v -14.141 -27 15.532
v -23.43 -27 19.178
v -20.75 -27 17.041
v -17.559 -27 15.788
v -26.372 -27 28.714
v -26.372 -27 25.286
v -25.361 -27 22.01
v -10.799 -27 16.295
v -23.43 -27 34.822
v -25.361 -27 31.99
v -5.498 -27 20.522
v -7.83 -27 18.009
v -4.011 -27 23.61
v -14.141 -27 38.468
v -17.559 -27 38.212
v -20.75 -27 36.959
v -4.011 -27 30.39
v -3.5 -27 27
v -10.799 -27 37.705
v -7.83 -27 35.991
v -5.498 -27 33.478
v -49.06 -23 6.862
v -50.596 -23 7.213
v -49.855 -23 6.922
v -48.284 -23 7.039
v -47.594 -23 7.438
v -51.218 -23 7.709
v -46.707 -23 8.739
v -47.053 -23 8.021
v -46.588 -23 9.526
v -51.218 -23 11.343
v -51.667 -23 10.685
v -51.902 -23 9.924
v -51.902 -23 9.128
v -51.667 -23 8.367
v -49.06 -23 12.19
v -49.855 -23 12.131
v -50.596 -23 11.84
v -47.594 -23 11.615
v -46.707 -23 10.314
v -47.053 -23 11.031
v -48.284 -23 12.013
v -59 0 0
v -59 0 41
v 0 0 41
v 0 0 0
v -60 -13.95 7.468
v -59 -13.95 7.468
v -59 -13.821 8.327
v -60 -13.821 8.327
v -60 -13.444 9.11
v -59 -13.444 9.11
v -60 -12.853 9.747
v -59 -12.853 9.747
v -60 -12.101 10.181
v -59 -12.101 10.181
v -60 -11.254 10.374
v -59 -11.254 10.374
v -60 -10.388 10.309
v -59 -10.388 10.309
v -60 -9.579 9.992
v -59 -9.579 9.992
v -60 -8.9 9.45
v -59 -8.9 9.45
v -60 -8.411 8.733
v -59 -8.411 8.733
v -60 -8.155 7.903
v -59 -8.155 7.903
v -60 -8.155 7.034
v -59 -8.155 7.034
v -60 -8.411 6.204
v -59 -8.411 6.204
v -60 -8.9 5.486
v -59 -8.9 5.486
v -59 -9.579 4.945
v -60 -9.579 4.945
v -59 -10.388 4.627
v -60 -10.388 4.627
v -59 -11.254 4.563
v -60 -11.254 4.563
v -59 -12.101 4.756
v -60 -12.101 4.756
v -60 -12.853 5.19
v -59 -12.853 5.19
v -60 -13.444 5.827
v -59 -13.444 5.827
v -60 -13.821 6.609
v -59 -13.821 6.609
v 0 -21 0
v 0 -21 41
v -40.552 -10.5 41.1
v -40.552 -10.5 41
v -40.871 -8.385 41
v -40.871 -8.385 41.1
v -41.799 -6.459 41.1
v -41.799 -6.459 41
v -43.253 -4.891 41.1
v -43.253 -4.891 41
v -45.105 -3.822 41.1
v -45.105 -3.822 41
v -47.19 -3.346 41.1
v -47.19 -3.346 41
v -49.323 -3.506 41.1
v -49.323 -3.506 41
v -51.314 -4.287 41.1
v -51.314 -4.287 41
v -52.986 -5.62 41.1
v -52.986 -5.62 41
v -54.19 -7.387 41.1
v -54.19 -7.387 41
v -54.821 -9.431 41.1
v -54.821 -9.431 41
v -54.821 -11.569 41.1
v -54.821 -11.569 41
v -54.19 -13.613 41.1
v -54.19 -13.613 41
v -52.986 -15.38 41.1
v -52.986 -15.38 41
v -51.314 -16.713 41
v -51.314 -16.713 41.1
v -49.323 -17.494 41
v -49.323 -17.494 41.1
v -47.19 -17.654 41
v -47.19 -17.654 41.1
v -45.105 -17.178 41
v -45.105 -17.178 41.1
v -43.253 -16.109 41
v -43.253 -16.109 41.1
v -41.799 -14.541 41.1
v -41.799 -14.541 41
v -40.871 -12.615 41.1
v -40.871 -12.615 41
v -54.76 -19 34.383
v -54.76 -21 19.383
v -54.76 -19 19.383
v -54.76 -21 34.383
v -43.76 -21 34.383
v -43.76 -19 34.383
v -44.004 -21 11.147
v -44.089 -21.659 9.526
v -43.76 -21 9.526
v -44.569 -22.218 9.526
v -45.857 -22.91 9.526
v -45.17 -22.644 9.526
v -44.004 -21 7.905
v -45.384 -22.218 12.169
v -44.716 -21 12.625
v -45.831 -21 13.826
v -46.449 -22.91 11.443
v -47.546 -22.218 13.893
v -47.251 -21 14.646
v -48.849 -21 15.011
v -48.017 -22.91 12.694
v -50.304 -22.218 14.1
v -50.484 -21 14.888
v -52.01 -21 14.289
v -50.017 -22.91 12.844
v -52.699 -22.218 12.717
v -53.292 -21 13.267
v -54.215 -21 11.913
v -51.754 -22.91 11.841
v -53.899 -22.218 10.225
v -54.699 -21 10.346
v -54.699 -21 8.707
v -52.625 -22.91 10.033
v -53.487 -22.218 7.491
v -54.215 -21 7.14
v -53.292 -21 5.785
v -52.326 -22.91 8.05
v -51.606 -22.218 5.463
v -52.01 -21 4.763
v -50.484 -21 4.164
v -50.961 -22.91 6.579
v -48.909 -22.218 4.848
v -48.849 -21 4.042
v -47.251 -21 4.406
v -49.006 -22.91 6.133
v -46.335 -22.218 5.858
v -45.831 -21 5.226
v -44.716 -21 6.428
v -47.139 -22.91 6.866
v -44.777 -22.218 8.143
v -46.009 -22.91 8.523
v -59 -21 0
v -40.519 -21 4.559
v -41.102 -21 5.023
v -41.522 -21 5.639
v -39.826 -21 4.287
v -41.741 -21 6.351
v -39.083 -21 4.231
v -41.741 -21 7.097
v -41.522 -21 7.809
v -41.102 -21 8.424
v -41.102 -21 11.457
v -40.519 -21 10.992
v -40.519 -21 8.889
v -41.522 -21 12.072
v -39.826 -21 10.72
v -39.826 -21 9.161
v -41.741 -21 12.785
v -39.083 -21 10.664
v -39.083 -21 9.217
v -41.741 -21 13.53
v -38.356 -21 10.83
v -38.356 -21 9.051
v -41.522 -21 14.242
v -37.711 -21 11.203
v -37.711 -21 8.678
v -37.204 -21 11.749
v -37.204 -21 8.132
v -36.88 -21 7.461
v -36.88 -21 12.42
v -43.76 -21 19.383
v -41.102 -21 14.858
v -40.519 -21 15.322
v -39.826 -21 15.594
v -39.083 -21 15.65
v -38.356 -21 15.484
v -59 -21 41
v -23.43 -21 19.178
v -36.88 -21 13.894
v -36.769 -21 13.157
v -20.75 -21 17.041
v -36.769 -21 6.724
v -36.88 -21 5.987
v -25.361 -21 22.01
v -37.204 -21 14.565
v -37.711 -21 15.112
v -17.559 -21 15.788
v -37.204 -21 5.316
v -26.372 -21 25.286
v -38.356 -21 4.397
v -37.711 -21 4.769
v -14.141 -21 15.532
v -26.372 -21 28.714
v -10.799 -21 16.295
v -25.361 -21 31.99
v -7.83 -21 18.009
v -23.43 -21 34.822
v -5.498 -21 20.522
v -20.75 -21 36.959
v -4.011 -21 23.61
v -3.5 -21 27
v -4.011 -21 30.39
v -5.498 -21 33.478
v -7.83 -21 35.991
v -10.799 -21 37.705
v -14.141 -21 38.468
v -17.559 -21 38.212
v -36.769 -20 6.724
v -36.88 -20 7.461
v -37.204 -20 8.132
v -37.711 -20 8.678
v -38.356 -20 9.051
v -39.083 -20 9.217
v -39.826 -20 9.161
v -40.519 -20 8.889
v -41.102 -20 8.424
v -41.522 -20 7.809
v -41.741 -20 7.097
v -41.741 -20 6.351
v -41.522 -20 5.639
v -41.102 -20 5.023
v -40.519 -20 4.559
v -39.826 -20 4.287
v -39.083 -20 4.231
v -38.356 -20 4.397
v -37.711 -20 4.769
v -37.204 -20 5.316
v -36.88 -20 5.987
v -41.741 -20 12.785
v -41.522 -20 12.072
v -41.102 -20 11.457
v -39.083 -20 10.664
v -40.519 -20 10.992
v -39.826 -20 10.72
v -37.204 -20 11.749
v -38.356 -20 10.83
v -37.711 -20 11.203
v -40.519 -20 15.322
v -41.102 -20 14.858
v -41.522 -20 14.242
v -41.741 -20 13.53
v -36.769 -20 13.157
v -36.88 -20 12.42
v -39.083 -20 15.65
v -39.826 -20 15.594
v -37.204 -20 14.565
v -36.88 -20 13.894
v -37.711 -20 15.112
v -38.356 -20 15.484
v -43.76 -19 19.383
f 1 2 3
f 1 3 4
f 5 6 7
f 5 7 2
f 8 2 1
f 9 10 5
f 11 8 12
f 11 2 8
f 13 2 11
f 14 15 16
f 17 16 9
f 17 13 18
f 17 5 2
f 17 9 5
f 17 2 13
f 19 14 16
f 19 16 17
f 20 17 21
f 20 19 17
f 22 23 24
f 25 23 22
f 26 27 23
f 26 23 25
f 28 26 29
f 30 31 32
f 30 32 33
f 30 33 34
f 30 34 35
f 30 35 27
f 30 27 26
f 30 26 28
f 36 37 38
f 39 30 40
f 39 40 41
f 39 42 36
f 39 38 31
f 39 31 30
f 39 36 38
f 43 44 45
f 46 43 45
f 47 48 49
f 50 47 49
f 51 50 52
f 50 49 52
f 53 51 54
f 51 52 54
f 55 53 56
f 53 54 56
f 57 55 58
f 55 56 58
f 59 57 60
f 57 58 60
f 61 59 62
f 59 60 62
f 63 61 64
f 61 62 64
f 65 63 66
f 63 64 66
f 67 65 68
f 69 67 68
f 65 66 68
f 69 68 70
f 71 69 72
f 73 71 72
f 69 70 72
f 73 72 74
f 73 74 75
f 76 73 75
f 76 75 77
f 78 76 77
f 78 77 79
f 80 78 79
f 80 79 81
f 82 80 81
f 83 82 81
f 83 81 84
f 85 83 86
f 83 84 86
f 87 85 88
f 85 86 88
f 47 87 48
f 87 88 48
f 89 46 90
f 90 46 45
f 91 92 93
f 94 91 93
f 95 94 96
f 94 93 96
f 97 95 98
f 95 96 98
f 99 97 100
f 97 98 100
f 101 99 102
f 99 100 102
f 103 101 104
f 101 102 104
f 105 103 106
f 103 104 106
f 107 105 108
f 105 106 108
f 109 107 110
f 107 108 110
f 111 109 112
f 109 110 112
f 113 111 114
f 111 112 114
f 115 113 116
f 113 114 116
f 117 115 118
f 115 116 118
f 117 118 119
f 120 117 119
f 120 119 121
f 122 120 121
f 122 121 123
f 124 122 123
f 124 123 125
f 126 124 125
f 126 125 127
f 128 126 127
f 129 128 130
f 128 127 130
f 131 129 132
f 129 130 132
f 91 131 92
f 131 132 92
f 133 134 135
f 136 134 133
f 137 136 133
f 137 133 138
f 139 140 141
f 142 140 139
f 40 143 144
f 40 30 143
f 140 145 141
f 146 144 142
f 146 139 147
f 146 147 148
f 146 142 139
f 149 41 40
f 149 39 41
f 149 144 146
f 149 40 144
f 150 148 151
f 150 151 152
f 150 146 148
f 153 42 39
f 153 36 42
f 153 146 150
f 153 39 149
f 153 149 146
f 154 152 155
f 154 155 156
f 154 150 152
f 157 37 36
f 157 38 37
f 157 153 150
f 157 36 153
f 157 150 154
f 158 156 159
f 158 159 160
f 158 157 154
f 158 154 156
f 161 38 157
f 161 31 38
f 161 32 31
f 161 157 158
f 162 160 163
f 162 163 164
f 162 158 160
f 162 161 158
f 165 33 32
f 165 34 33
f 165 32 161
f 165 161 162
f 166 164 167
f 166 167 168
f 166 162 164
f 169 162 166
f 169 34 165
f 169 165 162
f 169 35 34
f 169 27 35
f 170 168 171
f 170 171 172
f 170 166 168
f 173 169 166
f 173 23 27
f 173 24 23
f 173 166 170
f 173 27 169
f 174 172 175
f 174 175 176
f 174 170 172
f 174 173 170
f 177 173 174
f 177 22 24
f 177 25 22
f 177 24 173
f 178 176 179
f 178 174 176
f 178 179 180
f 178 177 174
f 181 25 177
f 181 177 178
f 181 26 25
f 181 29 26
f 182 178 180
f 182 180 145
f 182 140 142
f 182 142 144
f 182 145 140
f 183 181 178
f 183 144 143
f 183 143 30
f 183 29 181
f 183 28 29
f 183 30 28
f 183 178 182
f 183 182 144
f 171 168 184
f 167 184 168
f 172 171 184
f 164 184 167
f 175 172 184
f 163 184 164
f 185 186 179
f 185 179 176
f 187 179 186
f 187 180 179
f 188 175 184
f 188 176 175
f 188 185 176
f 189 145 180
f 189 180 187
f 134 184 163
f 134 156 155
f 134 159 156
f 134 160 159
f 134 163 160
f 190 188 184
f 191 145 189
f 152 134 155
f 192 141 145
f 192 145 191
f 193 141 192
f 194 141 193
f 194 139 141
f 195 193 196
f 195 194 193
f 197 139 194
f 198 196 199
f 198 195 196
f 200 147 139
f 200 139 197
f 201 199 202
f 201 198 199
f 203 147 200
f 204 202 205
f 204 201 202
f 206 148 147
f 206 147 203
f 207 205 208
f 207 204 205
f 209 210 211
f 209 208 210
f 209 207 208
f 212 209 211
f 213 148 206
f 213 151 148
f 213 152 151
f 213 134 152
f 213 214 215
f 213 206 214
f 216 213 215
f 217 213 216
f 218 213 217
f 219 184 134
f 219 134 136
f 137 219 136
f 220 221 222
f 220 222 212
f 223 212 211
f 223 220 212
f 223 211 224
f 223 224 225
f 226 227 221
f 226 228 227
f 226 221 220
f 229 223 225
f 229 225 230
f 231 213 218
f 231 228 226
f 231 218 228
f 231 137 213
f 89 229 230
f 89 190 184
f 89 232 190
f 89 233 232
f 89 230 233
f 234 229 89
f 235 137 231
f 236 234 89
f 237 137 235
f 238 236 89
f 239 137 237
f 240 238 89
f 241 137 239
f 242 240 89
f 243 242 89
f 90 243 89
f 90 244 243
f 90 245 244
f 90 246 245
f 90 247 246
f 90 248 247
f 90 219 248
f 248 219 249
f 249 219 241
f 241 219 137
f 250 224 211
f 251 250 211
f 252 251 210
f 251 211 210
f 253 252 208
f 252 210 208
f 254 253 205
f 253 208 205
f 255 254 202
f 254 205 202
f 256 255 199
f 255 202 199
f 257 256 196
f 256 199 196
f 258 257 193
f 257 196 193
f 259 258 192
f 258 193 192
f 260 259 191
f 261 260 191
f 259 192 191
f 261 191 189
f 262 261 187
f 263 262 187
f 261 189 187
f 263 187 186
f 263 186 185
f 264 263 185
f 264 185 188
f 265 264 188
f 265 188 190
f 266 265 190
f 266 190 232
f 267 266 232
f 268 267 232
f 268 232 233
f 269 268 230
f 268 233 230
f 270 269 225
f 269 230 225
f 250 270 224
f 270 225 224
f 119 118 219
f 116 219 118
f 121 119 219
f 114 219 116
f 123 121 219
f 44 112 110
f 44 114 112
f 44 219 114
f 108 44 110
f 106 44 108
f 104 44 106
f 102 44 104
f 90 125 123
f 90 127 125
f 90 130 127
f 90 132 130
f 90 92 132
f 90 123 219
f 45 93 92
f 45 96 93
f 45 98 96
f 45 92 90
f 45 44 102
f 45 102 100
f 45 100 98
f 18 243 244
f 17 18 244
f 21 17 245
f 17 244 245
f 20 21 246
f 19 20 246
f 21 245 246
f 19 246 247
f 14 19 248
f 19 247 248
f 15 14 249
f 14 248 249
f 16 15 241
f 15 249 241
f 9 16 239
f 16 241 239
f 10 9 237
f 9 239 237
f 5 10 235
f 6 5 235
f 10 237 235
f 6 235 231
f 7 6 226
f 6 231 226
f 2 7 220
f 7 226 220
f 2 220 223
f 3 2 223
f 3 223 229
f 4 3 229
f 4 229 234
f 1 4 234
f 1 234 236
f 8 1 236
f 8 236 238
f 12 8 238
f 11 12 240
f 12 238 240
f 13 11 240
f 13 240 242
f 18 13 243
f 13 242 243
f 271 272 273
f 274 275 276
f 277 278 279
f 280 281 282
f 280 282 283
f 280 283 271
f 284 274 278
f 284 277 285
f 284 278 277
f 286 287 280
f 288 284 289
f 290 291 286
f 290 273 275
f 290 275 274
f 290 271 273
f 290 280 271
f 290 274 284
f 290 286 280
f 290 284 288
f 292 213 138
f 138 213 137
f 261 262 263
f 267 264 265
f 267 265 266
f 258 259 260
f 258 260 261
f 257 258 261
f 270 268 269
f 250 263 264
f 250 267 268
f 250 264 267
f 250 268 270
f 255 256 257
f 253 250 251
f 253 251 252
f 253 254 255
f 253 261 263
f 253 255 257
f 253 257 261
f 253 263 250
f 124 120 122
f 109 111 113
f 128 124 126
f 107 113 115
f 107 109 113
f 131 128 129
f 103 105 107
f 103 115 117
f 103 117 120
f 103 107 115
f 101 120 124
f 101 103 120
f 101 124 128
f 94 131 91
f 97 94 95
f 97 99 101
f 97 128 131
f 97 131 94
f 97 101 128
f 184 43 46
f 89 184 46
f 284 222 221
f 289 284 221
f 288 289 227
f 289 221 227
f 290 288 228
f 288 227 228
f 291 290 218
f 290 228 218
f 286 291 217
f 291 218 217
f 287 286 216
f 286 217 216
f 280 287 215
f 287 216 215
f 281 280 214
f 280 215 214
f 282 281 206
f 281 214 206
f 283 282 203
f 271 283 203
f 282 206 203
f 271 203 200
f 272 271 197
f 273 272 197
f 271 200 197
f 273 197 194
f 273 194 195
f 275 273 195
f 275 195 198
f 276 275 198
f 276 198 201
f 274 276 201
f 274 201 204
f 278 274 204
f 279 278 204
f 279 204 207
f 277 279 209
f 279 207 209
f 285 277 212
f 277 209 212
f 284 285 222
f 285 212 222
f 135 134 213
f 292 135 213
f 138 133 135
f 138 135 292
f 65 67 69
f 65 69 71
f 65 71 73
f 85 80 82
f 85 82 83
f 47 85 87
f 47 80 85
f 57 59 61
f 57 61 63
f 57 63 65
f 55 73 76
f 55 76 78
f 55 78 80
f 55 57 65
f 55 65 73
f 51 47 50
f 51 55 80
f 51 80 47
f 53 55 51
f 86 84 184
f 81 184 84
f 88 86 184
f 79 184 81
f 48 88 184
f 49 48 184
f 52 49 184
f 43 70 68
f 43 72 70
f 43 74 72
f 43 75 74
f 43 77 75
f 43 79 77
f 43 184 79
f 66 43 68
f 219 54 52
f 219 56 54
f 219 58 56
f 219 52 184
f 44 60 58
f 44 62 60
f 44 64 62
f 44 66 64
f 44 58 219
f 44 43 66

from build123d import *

# Parameters (mm, degrees)
F0_W      = 59
F0_H      = 41
F1_DEPTH  = 21
F2_R      = 11.5
F3_DEPTH  = 6
F2_W      = 11
F2_H      = 15
F4_DEPTH  = 2
F2_R_2    = 5.5
F5_DEPTH  = 2
F2_R_3    = 2.5
F7_DEPTH  = 1
F8_R      = 2.913941294
F9_DEPTH  = 1
F10_R     = 7.1742199979
F11_DEPTH = 0.1


# Not quite as in the source:
# - a fillet or chamfer that OpenCascade refuses, or shapes differently, is made with other operations: its cross-section is extruded or revolved along the edge and cut away or added
# - a feature of the source that left no trace in its solid (it failed there, or was rolled back) is left out


with BuildPart() as f1:
    # F0 (on Front) → F1 (new body)
    with BuildSketch(Plane.XZ):
        with Locations((-29.5, 20.5)):
            Rectangle(F0_W, F0_H)
    extrude(amount=F1_DEPTH)

    # F2 (on face) → F3 (join)
    with BuildSketch(Plane.XZ.offset(21)):
        with Locations((-15, 27)):
            Circle(F2_R)
    extrude(amount=F3_DEPTH)

    # F2 (on face) → F4 (cut)
    with BuildSketch(Plane.XZ.offset(21)):
        with Locations((-49.2600723803, 26.8833857775)):
            Rectangle(F2_W, F2_H)
    extrude(amount=-F4_DEPTH, mode=Mode.SUBTRACT)

    # F2 (on face) → F5 (join)
    with BuildSketch(Plane.XZ.offset(21)):
        with Locations((-49.2600723803, 9.5262574032)):
            Circle(F2_R_2)
    extrude(amount=F5_DEPTH)

    # F6: fillet of radius 3 on 1 edges, made by hand

    # F6_s1 → F6_t2 (revolve, cut)
    with BuildSketch(Plane.XY.offset(9.5262574032)):
        with BuildLine():
            ThreePointArc((-43.7600723803, -21), (-44.8564486975, -22.4494897428), (-46.5884995051, -23))
            Line((-46.5884995051, -23), (-43.7600723803, -23))
            Line((-43.7600723803, -23), (-43.7600723803, -21))
        make_face()
    revolve(axis=Axis((-49.2600723803, -23, 9.5262574032), (0, -1, 0)), mode=Mode.SUBTRACT)

    # F2 (on face) → F7 (cut)
    with BuildSketch(Plane.XZ.offset(21)):
        with Locations((-39.2693579197, 13.1571451202)):
            Circle(F2_R_3)
        with Locations((-39.2693579197, 6.7239077762)):
            Circle(F2_R_3)
    extrude(amount=-F7_DEPTH, mode=Mode.SUBTRACT)

    # F8 (on face) → F9 (join)
    with BuildSketch(Plane(origin=(-59, 0, 0), x_dir=(0, -1, 0), z_dir=(-1, 0, 0))):
        with Locations((11.0362954438, 7.4682990089)):
            Circle(F8_R)
    extrude(amount=F9_DEPTH)

    # F10 (on face) → F11 (join)
    with BuildSketch(Plane.XY.offset(41)):
        with Locations((-47.7264709771, -10.5)):
            Circle(F10_R)
    extrude(amount=F11_DEPTH)


solid = f1.part
